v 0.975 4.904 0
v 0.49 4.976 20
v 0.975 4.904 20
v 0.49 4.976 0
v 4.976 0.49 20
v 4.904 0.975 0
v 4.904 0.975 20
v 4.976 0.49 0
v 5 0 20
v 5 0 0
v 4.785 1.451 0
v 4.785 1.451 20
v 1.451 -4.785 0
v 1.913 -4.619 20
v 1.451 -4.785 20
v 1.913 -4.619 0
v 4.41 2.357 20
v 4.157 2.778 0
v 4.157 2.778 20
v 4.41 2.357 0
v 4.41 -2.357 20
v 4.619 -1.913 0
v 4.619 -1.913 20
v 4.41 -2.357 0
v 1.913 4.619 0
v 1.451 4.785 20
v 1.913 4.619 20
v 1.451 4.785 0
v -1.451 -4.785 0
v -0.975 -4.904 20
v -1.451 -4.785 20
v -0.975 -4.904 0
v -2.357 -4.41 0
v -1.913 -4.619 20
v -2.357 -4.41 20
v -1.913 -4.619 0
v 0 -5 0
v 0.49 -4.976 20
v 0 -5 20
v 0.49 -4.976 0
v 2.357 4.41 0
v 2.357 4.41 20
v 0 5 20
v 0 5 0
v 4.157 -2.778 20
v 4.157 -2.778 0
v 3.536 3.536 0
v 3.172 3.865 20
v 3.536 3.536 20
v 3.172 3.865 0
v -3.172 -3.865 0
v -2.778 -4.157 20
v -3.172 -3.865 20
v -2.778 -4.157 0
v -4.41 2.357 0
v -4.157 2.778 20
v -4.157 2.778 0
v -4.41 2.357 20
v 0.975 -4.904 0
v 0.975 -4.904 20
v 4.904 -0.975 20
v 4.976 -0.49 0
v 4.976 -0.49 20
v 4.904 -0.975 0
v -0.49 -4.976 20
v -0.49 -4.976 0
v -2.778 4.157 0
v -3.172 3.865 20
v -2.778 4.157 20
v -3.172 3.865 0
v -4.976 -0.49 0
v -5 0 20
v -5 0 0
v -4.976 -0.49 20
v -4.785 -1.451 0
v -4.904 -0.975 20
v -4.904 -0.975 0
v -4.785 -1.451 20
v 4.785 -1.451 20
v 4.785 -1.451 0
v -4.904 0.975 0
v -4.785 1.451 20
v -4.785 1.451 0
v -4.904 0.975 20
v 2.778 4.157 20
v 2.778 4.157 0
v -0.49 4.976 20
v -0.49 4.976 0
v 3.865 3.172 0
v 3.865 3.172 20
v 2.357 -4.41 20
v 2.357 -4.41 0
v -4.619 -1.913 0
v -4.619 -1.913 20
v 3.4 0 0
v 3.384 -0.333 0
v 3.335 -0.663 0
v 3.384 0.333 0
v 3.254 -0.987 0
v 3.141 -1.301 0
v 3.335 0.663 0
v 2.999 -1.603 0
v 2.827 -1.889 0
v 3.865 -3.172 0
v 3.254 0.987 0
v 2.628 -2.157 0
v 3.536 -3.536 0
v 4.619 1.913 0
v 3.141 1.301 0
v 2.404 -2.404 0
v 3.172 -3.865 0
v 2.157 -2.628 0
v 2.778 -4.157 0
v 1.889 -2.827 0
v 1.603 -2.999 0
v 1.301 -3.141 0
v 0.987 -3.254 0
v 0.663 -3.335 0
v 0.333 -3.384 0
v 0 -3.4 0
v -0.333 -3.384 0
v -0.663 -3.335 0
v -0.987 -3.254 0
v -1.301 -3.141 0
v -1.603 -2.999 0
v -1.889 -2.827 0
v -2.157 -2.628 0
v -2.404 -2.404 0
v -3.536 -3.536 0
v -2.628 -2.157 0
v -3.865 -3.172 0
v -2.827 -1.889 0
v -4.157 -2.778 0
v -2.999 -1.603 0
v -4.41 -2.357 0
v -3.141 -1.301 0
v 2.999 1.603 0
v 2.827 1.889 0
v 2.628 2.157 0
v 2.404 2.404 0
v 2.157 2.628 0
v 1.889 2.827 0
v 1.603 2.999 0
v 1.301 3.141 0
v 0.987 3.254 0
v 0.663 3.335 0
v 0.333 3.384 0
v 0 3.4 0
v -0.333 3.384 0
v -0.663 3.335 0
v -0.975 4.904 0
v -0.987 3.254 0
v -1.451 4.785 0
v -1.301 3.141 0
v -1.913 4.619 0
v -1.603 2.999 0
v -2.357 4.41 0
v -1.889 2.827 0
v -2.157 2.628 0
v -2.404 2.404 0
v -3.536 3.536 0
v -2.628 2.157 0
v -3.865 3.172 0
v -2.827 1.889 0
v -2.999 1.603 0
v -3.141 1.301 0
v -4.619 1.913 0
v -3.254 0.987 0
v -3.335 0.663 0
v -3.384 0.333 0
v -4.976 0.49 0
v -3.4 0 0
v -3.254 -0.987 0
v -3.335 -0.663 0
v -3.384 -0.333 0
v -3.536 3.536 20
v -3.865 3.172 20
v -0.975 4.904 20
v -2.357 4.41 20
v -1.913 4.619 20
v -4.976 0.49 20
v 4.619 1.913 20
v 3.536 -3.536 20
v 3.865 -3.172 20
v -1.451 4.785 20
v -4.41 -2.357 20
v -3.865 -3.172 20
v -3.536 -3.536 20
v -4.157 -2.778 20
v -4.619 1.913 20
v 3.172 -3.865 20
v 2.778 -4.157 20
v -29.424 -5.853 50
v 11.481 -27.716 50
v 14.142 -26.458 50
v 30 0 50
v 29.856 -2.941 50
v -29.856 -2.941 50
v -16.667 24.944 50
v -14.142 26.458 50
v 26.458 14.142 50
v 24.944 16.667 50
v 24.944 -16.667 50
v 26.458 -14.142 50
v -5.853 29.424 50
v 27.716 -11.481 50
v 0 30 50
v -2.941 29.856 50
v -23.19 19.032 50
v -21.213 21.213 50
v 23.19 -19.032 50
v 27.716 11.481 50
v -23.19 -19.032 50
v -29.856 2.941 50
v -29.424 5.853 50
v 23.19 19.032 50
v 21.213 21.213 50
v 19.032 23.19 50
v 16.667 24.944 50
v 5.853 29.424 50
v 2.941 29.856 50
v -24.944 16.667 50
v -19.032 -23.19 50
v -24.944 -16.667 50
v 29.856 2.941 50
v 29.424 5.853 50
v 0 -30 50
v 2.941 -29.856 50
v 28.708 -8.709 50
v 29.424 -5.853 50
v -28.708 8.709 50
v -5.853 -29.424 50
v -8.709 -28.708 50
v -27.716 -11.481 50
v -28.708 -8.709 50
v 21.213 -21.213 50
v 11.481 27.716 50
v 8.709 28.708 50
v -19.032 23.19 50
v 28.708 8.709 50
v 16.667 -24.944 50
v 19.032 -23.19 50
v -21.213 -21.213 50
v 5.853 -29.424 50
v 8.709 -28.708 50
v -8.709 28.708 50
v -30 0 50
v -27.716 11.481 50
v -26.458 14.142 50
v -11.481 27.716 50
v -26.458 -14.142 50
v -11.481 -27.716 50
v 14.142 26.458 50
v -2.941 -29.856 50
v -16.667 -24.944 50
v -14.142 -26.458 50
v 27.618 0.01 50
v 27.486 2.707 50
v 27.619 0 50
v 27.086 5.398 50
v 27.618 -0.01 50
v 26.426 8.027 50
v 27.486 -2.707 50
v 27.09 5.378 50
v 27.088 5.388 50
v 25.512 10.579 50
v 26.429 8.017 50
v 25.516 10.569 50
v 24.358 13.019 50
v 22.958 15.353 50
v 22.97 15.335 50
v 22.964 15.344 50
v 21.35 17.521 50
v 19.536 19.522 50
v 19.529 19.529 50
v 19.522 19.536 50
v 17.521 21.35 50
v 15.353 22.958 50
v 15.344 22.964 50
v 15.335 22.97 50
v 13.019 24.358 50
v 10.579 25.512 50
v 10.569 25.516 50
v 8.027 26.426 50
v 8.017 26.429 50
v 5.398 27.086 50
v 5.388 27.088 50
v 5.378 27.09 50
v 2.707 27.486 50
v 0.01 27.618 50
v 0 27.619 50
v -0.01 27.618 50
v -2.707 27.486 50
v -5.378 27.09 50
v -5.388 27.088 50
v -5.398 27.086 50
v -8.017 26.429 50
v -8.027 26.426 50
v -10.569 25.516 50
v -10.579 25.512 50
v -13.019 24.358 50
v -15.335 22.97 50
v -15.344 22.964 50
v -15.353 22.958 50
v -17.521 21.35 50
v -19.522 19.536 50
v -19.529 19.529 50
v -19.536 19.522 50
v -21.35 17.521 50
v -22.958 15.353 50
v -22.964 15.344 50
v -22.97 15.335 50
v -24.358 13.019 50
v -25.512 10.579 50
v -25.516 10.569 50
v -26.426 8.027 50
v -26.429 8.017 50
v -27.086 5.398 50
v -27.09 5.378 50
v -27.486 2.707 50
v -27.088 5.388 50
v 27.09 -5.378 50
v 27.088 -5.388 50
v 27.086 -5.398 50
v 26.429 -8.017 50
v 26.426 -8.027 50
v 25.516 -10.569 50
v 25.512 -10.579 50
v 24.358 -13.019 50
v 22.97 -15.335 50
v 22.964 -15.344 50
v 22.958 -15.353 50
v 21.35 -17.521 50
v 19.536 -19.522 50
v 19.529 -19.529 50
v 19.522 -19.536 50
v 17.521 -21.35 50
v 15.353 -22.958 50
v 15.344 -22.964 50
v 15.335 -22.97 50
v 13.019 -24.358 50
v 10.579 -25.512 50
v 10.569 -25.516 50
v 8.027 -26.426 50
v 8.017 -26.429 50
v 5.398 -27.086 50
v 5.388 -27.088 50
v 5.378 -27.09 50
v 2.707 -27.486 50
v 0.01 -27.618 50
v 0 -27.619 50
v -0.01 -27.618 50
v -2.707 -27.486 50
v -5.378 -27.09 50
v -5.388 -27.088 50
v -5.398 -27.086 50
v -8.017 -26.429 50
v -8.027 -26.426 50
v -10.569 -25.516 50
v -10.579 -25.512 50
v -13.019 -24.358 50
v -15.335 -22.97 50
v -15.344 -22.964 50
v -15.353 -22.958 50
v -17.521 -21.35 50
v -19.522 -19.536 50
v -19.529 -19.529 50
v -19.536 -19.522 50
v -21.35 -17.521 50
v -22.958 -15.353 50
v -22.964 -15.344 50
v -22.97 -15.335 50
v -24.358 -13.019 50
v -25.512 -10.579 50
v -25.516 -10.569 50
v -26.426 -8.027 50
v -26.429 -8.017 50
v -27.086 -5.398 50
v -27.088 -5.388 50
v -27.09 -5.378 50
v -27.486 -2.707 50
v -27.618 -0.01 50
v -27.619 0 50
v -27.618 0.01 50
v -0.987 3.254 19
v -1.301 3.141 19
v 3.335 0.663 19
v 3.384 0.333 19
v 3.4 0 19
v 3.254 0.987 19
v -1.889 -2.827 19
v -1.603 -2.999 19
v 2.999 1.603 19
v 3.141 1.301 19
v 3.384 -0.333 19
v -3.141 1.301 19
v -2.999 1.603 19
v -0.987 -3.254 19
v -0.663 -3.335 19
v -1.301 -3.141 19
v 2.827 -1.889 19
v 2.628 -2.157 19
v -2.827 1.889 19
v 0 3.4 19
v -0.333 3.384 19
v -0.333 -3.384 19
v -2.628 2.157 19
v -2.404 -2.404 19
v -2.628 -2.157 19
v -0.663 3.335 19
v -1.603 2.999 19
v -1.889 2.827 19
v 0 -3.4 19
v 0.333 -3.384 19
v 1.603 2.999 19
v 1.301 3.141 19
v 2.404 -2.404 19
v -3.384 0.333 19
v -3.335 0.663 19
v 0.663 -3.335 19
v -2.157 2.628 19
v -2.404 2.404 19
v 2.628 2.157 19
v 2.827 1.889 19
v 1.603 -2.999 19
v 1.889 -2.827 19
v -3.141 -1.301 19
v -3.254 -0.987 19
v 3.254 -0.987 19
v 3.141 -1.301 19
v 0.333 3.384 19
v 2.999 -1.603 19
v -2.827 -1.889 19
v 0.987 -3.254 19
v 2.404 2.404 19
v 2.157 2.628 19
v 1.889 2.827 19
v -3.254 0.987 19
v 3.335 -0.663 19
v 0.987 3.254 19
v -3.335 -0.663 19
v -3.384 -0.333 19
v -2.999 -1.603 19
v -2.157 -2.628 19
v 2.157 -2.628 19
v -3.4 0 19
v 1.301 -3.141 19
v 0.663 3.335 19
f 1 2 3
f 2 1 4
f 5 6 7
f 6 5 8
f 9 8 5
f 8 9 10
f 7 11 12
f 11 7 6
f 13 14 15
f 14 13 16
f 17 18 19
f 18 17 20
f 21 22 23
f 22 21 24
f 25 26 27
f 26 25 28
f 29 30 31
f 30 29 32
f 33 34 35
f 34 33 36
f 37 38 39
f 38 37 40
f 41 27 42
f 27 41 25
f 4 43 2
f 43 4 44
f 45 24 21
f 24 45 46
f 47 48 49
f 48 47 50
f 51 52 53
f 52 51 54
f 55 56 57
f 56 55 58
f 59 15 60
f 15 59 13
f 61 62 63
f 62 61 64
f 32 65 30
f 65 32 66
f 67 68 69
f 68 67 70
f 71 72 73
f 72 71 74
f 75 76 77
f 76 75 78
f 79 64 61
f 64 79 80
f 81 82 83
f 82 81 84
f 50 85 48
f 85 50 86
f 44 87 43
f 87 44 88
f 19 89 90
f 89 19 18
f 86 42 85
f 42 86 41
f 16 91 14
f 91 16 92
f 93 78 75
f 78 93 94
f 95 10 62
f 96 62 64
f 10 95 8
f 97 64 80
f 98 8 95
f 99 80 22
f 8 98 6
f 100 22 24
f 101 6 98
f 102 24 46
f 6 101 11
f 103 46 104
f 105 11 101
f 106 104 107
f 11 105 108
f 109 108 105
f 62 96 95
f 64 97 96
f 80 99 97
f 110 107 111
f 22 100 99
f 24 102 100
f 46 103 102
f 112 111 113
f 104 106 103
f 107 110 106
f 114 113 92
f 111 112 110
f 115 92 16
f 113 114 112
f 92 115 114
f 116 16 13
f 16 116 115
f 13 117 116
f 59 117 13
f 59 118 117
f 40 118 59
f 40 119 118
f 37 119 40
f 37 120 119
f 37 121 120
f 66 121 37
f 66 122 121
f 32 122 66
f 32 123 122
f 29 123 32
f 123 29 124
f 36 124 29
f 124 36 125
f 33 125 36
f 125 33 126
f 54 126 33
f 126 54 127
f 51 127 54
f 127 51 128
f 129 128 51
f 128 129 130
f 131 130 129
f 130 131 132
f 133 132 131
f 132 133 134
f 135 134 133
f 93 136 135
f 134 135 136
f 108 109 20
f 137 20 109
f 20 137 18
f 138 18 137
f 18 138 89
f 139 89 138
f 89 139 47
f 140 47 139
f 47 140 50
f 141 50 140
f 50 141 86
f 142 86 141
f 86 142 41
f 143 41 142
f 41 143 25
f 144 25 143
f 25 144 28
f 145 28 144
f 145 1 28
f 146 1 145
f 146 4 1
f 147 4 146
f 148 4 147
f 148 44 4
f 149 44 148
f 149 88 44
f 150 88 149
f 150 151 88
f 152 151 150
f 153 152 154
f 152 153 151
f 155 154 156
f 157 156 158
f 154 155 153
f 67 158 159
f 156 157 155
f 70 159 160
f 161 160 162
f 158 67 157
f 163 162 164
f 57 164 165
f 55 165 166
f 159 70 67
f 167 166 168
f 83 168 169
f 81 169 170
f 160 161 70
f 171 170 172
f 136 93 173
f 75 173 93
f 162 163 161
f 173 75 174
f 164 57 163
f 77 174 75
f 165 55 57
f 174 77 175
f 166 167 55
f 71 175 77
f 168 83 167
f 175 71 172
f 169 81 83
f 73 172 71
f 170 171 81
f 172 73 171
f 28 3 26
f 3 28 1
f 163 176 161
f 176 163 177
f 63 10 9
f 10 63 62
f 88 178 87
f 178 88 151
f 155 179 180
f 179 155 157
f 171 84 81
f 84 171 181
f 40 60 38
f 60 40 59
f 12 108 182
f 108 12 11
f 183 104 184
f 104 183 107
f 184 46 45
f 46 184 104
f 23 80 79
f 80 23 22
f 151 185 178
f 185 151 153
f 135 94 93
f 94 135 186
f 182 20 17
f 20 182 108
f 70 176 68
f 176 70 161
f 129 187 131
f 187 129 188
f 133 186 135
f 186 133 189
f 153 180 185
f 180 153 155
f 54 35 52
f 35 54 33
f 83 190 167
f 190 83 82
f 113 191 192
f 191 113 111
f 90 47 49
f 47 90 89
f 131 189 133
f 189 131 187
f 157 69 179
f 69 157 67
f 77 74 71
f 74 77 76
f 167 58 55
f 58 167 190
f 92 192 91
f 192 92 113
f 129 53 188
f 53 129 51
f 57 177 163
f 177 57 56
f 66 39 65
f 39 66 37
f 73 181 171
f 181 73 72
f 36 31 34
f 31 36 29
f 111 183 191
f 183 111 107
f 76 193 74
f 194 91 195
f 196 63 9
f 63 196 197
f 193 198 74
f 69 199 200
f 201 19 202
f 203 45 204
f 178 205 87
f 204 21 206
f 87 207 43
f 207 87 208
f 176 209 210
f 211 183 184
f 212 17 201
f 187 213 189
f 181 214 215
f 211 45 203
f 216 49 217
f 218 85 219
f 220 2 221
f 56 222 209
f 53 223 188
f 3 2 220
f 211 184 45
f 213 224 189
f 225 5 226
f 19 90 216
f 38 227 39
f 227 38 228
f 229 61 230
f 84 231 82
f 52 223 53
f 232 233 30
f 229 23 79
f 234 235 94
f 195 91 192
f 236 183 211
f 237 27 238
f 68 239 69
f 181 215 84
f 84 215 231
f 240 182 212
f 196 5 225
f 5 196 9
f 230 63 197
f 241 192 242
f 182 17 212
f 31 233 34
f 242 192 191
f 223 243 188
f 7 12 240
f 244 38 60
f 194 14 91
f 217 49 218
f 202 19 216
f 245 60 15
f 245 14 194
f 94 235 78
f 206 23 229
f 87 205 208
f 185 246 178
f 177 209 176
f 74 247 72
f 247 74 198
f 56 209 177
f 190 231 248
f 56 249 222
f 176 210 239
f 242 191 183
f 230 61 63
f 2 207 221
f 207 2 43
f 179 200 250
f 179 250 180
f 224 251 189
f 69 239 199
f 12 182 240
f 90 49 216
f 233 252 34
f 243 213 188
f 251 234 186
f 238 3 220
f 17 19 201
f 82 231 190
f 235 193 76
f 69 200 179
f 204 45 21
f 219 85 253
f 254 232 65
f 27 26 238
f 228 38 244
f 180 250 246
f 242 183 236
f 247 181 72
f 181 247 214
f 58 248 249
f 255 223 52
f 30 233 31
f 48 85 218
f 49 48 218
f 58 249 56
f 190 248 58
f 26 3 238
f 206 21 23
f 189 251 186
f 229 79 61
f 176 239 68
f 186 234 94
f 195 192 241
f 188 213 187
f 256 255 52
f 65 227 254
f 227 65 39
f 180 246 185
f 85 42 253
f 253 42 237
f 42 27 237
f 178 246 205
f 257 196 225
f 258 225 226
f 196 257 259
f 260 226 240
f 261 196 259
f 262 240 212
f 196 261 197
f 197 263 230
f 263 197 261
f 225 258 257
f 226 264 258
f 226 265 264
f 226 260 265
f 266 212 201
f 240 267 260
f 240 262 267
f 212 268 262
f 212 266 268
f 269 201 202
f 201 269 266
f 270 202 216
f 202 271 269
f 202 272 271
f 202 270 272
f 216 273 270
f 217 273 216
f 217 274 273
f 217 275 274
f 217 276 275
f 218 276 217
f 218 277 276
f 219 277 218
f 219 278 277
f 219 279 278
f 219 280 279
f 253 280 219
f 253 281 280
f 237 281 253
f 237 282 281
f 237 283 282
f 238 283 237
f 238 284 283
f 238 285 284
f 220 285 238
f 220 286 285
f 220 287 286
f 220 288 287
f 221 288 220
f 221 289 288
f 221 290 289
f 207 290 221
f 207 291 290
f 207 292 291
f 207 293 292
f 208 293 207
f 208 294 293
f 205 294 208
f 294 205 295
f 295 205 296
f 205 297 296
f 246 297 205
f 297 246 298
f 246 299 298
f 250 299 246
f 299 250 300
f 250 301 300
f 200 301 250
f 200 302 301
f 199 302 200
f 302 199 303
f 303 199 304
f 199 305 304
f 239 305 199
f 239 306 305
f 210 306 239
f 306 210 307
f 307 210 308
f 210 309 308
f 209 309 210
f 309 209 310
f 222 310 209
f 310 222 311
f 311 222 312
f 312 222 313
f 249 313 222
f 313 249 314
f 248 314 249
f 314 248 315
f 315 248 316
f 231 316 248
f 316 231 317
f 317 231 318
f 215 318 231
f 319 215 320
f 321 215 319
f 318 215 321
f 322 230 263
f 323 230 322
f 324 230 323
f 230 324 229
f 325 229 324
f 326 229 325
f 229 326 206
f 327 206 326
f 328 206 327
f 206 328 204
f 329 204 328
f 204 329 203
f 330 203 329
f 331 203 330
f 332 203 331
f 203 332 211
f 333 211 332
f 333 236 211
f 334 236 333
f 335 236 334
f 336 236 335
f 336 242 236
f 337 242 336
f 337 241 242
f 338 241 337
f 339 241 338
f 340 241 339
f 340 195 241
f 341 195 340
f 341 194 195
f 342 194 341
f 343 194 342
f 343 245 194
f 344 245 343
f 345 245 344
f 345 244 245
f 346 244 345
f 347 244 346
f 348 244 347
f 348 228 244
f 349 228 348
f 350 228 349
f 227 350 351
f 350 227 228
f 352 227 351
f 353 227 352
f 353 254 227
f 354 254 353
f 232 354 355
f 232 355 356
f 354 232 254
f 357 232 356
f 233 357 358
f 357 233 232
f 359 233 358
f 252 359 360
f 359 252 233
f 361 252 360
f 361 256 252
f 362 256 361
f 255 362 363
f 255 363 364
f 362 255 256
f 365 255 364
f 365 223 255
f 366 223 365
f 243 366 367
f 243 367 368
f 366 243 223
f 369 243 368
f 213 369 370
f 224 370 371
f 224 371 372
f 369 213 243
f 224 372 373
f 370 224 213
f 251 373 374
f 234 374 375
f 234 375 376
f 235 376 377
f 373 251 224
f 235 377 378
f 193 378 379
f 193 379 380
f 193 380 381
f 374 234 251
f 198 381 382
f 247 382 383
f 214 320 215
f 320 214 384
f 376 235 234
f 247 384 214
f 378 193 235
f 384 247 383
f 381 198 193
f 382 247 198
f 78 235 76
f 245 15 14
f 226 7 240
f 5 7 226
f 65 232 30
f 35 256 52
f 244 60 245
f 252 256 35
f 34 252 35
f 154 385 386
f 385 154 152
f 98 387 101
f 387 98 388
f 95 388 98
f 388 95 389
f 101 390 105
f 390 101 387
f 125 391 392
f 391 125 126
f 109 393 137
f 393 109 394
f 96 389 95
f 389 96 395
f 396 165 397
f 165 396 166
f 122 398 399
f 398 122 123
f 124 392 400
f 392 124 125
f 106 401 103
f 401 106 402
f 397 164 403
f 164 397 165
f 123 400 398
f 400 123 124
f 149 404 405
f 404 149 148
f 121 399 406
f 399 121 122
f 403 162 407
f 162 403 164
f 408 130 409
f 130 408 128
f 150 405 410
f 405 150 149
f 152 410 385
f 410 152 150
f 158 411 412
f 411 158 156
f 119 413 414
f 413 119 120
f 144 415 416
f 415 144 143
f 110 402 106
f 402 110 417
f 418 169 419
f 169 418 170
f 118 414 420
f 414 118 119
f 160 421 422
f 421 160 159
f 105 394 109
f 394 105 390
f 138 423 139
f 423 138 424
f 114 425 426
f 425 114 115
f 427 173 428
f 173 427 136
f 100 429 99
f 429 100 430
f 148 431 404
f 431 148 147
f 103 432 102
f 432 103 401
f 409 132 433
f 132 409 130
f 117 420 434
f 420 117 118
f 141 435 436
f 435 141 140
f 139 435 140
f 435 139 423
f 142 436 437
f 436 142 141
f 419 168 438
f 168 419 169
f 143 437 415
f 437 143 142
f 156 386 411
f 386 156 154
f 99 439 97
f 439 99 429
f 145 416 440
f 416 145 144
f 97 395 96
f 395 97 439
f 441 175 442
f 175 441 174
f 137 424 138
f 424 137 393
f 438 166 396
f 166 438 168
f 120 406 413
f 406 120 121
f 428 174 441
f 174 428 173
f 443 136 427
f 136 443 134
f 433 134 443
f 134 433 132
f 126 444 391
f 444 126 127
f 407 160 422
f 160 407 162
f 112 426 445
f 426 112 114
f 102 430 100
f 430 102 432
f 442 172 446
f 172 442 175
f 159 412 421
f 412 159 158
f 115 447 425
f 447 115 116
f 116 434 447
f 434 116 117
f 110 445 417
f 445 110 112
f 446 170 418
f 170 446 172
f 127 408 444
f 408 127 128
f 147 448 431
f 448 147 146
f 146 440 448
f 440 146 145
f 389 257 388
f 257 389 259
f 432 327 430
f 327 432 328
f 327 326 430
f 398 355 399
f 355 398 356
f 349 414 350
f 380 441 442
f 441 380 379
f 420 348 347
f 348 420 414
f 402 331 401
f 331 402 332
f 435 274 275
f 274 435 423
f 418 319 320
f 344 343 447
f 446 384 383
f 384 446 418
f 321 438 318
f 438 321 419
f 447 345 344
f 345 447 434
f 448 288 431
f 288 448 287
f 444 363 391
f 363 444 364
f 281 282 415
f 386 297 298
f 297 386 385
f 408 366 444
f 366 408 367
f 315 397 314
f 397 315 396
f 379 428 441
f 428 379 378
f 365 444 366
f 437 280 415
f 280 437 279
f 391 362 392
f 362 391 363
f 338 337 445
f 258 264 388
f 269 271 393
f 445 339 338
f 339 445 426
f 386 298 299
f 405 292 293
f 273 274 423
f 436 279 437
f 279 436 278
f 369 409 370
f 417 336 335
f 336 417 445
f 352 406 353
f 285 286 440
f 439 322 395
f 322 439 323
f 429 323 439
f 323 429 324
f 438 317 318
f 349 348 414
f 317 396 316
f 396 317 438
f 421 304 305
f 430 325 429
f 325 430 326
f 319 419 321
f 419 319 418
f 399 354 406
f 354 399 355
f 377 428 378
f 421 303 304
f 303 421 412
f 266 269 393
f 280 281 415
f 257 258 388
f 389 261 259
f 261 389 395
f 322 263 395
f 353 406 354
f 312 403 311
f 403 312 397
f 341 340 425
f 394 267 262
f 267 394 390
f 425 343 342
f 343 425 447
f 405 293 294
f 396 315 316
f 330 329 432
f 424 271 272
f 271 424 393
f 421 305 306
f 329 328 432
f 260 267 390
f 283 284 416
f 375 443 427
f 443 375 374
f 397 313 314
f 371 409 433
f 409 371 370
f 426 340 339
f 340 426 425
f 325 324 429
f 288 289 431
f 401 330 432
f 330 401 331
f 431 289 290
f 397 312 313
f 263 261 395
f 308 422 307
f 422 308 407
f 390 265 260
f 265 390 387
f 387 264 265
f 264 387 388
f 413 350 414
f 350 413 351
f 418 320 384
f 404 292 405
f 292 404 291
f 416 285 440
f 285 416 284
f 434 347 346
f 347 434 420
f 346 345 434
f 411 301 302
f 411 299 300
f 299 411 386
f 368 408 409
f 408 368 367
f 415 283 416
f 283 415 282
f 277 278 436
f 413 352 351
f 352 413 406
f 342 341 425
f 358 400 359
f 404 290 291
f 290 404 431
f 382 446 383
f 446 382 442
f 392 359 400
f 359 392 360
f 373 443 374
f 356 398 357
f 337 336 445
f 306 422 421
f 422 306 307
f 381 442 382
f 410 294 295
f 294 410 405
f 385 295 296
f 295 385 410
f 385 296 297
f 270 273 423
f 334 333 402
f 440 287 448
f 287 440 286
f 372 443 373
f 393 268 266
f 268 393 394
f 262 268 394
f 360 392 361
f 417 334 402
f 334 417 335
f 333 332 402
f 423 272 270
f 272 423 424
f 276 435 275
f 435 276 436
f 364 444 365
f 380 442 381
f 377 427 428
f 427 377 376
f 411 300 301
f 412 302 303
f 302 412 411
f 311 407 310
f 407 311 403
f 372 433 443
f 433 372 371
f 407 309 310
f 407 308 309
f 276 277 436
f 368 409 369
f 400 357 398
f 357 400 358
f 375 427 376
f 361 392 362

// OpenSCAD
// Lab Funnel - A straight spout tube with a conical funnel on top.
// Printed upright with the wide opening at the top.
// Spout: 10mm OD, 20mm long. Funnel: widens from 10mm to 60mm OD over 30mm height.
// Wall thickness: 1.6mm everywhere.

$fn = 64;

// Dimensions
spout_od      = 10;
wall          = 1.6;
spout_id      = spout_od - 2 * wall; // 6.8
spout_height  = 20;
funnel_start_od = spout_od;
funnel_end_od   = 60;
funnel_height   = 50 - spout_height; // 30

// Build the part from the bottom (z=0) upwards.
// We use a difference operation to cut the inner bore from a solid outer shell.

difference() {
    // 1. Outer Shell
    union() {
        // Spout section (cylinder)
        cylinder(h = spout_height, d = spout_od);
        
        // Funnel section (cone)
        // Cone starts at z = spout_height with d = funnel_start_od
        // Cone ends at z = 50 with d = funnel_end_od
        translate([0, 0, spout_height]) 
            cylinder(h = funnel_height, d1 = funnel_start_od, d2 = funnel_end_od);
    }
    
    // 2. Inner Bore (cutting shapes)
    // We extend the cutting cylinders slightly past the faces to ensure clean cuts.
    
    // Spout bore
    translate([0, 0, -1]) 
        cylinder(h = spout_height + 2, d = spout_id);
        
    // Funnel bore (cone)
    // Must align exactly with the outer cone: starts at z=spout_height, ends at z=50.
    // d1 is at the start (z=spout_height), d2 is at the end (z=50).
    translate([0, 0, spout_height - 1]) 
        cylinder(h = funnel_height + 2, d1 = spout_id, d2 = funnel_end_od - 2 * wall);
}
